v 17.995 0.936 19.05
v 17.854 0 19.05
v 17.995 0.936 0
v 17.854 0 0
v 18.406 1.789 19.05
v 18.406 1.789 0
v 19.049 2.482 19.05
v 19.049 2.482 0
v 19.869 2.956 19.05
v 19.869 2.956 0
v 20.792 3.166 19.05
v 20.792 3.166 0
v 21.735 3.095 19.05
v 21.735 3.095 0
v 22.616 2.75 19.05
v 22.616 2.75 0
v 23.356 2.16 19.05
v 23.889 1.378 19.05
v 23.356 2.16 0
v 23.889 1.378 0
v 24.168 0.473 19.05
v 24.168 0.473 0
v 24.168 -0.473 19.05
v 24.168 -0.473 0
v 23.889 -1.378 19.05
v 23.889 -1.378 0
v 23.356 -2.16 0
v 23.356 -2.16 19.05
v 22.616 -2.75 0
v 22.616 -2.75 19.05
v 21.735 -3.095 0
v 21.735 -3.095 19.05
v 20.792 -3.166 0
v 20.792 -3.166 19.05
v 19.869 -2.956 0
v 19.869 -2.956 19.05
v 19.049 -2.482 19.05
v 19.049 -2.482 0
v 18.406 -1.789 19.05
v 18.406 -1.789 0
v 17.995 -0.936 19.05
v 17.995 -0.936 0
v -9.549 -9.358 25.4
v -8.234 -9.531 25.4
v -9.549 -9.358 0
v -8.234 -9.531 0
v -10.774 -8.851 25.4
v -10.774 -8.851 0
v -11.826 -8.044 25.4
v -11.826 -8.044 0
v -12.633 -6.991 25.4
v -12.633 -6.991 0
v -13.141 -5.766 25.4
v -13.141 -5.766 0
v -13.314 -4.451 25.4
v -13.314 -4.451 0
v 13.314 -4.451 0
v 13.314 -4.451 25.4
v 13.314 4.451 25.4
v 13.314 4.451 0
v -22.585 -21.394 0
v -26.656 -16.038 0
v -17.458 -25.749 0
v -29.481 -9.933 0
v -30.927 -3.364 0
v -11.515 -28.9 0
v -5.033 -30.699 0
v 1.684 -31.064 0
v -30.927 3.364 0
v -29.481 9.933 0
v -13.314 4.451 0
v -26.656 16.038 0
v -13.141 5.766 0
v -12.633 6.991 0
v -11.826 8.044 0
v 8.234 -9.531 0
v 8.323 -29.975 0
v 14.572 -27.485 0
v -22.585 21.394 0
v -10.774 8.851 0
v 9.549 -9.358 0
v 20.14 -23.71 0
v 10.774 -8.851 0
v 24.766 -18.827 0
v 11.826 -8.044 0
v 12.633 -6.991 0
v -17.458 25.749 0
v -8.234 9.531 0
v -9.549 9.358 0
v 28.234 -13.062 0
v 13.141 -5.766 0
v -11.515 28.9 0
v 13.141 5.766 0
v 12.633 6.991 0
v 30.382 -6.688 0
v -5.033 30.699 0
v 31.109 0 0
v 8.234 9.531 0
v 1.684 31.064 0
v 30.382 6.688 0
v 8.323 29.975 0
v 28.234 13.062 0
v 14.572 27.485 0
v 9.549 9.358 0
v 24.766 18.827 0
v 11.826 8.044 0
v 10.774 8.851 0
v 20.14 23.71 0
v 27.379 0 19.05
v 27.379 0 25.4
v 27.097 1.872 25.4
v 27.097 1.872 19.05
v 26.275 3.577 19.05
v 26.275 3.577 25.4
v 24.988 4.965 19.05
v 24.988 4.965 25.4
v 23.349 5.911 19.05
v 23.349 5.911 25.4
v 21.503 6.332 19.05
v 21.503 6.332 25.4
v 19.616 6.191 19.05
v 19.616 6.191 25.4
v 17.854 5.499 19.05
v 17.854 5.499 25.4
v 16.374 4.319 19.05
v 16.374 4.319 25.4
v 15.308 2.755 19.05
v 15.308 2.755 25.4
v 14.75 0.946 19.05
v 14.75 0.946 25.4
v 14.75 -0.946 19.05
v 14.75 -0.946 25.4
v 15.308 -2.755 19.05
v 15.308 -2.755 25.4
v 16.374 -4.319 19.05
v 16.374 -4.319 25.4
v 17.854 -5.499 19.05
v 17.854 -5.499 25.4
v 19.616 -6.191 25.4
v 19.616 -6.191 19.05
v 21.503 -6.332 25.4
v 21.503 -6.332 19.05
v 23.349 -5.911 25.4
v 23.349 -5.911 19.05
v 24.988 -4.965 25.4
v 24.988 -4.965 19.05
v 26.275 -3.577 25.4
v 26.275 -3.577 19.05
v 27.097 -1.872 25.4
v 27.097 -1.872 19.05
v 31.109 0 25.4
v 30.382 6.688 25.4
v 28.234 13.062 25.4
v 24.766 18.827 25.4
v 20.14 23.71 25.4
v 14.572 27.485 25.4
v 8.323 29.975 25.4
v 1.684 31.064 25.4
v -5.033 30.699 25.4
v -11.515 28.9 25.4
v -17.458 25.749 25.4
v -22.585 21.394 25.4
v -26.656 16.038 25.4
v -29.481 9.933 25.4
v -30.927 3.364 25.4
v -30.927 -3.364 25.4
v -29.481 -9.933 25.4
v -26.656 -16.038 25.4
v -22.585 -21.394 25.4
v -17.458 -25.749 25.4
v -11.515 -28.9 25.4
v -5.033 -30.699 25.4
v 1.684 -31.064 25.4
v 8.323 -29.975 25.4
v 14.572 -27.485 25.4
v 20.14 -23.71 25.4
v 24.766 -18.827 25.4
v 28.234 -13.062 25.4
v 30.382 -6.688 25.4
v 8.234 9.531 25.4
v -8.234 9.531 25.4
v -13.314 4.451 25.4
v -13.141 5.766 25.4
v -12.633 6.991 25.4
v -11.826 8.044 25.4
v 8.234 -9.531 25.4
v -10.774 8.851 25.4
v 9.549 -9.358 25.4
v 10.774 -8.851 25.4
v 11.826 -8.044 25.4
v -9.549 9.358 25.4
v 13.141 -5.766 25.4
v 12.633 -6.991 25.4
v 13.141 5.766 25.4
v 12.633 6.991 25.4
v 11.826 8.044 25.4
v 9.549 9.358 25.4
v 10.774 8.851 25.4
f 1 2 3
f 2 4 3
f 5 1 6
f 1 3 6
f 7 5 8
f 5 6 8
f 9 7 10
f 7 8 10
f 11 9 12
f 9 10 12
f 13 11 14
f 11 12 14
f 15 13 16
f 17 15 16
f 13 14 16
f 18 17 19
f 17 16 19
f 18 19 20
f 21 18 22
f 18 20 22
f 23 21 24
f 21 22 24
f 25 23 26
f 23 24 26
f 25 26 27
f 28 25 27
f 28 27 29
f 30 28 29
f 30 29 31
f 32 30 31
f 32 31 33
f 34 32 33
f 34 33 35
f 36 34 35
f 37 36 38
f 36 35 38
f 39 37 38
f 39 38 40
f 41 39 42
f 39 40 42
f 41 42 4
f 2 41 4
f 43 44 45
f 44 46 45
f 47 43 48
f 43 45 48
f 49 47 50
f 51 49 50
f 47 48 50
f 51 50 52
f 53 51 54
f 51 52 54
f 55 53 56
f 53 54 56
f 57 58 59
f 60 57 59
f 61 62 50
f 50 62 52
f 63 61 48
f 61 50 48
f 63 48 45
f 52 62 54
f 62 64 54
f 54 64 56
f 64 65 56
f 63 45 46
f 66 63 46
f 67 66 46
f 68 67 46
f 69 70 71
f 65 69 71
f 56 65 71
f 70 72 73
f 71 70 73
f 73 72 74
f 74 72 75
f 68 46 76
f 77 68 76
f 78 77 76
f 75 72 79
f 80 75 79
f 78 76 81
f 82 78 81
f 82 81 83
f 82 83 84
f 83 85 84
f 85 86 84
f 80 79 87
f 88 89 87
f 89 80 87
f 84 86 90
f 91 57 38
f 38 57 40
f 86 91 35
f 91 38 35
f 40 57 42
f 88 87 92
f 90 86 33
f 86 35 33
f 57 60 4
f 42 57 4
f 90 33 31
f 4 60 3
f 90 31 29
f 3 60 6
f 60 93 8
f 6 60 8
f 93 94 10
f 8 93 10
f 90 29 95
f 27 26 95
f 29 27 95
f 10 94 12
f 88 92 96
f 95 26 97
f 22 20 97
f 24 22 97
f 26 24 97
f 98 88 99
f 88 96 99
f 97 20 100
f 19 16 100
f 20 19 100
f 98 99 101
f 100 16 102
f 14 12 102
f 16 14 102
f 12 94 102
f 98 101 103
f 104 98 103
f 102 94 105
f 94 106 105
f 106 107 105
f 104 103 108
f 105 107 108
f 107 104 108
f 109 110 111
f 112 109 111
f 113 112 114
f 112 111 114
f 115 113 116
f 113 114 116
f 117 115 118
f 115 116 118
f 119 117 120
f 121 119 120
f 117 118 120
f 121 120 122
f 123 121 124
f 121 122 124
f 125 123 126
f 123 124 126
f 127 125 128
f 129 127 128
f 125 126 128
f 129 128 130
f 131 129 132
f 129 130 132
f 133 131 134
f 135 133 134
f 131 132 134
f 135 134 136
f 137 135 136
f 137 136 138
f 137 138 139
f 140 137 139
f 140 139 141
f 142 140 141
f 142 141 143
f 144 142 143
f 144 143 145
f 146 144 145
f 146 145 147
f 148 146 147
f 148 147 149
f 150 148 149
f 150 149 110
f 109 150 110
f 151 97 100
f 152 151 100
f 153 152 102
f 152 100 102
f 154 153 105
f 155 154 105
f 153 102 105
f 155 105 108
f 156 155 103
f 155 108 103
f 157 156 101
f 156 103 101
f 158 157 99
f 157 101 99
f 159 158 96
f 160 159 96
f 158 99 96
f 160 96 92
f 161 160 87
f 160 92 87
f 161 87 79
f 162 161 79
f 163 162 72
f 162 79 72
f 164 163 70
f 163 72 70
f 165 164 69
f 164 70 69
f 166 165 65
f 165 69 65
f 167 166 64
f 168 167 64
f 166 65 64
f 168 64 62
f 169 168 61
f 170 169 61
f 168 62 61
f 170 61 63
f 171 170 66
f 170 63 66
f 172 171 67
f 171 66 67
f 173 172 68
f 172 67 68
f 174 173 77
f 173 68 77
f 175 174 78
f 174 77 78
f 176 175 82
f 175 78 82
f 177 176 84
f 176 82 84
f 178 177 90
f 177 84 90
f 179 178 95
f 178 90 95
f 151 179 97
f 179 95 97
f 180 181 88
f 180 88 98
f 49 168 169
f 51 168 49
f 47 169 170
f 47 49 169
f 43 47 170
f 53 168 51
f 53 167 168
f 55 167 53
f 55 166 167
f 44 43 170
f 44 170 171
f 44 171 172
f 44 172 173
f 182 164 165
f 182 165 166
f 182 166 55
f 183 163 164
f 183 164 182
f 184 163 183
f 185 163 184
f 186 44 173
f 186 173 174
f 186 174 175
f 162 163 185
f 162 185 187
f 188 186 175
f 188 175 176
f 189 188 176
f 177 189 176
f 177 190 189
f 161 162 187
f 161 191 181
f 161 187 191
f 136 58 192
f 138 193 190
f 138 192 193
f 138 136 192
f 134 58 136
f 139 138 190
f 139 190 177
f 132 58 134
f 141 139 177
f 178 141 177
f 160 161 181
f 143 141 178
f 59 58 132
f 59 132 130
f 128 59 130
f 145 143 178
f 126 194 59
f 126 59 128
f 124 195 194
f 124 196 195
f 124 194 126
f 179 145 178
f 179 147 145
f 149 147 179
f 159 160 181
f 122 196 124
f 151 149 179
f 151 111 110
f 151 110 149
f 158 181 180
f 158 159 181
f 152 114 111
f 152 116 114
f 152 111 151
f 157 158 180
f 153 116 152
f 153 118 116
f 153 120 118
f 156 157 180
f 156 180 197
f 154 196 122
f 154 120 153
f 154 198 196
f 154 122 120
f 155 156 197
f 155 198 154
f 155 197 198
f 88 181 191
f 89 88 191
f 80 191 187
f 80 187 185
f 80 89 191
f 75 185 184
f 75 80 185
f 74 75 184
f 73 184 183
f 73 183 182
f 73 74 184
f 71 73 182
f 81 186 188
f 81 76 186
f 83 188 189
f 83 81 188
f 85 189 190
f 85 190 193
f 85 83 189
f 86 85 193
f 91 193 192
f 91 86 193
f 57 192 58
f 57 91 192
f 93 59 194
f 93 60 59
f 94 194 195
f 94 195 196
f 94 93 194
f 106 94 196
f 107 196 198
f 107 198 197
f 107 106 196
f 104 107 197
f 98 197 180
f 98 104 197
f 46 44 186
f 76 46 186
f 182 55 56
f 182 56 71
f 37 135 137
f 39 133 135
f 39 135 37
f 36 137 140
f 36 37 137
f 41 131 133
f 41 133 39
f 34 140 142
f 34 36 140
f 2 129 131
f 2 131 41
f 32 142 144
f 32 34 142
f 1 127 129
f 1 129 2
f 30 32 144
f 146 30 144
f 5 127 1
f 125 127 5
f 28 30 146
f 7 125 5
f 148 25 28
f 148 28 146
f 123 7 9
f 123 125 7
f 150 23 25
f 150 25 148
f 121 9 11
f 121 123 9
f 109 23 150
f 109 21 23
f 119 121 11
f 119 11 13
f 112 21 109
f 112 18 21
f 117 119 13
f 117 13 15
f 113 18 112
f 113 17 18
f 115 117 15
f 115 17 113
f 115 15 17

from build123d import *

# Parameters (mm, degrees)
F0_R           = 31.109261
F1_DEPTH       = 25.4
F2_W           = 26.62818
F2_H           = 19.062922
F3_DEPTH       = 25.4
F4_R           = 5.08
F6_D           = 6.35
F6_CBORE_D     = 12.7
F6_CBORE_DEPTH = 6.35


with BuildPart() as f1:
    # F0 (on Top) → F1 (new body)
    with BuildSketch(Plane.XY):
        Circle(F0_R)
    extrude(amount=F1_DEPTH)

    # F2 (on face) → F3 (cut)
    with BuildSketch(Plane.XY.offset(25.4)):
        Rectangle(F2_W, F2_H)
    extrude(amount=-F3_DEPTH, mode=Mode.SUBTRACT)

    # F4
    f4_edges = [f1.edges().sort_by_distance(p)[0] for p in [
        (-13.31409, 9.531461, 12.7),
        (-13.31409, -9.531461, 12.7),
        (13.31409, 9.531461, 12.7),
        (13.31409, -9.531461, 12.7),
    ]]
    fillet(f4_edges, radius=F4_R)

    # F6 (through all)
    with Locations(Plane.XY.offset(25.4)):
        with Locations((21.028863, 0)):
            CounterBoreHole(F6_D / 2, F6_CBORE_D / 2, F6_CBORE_DEPTH)


solid = f1.part
